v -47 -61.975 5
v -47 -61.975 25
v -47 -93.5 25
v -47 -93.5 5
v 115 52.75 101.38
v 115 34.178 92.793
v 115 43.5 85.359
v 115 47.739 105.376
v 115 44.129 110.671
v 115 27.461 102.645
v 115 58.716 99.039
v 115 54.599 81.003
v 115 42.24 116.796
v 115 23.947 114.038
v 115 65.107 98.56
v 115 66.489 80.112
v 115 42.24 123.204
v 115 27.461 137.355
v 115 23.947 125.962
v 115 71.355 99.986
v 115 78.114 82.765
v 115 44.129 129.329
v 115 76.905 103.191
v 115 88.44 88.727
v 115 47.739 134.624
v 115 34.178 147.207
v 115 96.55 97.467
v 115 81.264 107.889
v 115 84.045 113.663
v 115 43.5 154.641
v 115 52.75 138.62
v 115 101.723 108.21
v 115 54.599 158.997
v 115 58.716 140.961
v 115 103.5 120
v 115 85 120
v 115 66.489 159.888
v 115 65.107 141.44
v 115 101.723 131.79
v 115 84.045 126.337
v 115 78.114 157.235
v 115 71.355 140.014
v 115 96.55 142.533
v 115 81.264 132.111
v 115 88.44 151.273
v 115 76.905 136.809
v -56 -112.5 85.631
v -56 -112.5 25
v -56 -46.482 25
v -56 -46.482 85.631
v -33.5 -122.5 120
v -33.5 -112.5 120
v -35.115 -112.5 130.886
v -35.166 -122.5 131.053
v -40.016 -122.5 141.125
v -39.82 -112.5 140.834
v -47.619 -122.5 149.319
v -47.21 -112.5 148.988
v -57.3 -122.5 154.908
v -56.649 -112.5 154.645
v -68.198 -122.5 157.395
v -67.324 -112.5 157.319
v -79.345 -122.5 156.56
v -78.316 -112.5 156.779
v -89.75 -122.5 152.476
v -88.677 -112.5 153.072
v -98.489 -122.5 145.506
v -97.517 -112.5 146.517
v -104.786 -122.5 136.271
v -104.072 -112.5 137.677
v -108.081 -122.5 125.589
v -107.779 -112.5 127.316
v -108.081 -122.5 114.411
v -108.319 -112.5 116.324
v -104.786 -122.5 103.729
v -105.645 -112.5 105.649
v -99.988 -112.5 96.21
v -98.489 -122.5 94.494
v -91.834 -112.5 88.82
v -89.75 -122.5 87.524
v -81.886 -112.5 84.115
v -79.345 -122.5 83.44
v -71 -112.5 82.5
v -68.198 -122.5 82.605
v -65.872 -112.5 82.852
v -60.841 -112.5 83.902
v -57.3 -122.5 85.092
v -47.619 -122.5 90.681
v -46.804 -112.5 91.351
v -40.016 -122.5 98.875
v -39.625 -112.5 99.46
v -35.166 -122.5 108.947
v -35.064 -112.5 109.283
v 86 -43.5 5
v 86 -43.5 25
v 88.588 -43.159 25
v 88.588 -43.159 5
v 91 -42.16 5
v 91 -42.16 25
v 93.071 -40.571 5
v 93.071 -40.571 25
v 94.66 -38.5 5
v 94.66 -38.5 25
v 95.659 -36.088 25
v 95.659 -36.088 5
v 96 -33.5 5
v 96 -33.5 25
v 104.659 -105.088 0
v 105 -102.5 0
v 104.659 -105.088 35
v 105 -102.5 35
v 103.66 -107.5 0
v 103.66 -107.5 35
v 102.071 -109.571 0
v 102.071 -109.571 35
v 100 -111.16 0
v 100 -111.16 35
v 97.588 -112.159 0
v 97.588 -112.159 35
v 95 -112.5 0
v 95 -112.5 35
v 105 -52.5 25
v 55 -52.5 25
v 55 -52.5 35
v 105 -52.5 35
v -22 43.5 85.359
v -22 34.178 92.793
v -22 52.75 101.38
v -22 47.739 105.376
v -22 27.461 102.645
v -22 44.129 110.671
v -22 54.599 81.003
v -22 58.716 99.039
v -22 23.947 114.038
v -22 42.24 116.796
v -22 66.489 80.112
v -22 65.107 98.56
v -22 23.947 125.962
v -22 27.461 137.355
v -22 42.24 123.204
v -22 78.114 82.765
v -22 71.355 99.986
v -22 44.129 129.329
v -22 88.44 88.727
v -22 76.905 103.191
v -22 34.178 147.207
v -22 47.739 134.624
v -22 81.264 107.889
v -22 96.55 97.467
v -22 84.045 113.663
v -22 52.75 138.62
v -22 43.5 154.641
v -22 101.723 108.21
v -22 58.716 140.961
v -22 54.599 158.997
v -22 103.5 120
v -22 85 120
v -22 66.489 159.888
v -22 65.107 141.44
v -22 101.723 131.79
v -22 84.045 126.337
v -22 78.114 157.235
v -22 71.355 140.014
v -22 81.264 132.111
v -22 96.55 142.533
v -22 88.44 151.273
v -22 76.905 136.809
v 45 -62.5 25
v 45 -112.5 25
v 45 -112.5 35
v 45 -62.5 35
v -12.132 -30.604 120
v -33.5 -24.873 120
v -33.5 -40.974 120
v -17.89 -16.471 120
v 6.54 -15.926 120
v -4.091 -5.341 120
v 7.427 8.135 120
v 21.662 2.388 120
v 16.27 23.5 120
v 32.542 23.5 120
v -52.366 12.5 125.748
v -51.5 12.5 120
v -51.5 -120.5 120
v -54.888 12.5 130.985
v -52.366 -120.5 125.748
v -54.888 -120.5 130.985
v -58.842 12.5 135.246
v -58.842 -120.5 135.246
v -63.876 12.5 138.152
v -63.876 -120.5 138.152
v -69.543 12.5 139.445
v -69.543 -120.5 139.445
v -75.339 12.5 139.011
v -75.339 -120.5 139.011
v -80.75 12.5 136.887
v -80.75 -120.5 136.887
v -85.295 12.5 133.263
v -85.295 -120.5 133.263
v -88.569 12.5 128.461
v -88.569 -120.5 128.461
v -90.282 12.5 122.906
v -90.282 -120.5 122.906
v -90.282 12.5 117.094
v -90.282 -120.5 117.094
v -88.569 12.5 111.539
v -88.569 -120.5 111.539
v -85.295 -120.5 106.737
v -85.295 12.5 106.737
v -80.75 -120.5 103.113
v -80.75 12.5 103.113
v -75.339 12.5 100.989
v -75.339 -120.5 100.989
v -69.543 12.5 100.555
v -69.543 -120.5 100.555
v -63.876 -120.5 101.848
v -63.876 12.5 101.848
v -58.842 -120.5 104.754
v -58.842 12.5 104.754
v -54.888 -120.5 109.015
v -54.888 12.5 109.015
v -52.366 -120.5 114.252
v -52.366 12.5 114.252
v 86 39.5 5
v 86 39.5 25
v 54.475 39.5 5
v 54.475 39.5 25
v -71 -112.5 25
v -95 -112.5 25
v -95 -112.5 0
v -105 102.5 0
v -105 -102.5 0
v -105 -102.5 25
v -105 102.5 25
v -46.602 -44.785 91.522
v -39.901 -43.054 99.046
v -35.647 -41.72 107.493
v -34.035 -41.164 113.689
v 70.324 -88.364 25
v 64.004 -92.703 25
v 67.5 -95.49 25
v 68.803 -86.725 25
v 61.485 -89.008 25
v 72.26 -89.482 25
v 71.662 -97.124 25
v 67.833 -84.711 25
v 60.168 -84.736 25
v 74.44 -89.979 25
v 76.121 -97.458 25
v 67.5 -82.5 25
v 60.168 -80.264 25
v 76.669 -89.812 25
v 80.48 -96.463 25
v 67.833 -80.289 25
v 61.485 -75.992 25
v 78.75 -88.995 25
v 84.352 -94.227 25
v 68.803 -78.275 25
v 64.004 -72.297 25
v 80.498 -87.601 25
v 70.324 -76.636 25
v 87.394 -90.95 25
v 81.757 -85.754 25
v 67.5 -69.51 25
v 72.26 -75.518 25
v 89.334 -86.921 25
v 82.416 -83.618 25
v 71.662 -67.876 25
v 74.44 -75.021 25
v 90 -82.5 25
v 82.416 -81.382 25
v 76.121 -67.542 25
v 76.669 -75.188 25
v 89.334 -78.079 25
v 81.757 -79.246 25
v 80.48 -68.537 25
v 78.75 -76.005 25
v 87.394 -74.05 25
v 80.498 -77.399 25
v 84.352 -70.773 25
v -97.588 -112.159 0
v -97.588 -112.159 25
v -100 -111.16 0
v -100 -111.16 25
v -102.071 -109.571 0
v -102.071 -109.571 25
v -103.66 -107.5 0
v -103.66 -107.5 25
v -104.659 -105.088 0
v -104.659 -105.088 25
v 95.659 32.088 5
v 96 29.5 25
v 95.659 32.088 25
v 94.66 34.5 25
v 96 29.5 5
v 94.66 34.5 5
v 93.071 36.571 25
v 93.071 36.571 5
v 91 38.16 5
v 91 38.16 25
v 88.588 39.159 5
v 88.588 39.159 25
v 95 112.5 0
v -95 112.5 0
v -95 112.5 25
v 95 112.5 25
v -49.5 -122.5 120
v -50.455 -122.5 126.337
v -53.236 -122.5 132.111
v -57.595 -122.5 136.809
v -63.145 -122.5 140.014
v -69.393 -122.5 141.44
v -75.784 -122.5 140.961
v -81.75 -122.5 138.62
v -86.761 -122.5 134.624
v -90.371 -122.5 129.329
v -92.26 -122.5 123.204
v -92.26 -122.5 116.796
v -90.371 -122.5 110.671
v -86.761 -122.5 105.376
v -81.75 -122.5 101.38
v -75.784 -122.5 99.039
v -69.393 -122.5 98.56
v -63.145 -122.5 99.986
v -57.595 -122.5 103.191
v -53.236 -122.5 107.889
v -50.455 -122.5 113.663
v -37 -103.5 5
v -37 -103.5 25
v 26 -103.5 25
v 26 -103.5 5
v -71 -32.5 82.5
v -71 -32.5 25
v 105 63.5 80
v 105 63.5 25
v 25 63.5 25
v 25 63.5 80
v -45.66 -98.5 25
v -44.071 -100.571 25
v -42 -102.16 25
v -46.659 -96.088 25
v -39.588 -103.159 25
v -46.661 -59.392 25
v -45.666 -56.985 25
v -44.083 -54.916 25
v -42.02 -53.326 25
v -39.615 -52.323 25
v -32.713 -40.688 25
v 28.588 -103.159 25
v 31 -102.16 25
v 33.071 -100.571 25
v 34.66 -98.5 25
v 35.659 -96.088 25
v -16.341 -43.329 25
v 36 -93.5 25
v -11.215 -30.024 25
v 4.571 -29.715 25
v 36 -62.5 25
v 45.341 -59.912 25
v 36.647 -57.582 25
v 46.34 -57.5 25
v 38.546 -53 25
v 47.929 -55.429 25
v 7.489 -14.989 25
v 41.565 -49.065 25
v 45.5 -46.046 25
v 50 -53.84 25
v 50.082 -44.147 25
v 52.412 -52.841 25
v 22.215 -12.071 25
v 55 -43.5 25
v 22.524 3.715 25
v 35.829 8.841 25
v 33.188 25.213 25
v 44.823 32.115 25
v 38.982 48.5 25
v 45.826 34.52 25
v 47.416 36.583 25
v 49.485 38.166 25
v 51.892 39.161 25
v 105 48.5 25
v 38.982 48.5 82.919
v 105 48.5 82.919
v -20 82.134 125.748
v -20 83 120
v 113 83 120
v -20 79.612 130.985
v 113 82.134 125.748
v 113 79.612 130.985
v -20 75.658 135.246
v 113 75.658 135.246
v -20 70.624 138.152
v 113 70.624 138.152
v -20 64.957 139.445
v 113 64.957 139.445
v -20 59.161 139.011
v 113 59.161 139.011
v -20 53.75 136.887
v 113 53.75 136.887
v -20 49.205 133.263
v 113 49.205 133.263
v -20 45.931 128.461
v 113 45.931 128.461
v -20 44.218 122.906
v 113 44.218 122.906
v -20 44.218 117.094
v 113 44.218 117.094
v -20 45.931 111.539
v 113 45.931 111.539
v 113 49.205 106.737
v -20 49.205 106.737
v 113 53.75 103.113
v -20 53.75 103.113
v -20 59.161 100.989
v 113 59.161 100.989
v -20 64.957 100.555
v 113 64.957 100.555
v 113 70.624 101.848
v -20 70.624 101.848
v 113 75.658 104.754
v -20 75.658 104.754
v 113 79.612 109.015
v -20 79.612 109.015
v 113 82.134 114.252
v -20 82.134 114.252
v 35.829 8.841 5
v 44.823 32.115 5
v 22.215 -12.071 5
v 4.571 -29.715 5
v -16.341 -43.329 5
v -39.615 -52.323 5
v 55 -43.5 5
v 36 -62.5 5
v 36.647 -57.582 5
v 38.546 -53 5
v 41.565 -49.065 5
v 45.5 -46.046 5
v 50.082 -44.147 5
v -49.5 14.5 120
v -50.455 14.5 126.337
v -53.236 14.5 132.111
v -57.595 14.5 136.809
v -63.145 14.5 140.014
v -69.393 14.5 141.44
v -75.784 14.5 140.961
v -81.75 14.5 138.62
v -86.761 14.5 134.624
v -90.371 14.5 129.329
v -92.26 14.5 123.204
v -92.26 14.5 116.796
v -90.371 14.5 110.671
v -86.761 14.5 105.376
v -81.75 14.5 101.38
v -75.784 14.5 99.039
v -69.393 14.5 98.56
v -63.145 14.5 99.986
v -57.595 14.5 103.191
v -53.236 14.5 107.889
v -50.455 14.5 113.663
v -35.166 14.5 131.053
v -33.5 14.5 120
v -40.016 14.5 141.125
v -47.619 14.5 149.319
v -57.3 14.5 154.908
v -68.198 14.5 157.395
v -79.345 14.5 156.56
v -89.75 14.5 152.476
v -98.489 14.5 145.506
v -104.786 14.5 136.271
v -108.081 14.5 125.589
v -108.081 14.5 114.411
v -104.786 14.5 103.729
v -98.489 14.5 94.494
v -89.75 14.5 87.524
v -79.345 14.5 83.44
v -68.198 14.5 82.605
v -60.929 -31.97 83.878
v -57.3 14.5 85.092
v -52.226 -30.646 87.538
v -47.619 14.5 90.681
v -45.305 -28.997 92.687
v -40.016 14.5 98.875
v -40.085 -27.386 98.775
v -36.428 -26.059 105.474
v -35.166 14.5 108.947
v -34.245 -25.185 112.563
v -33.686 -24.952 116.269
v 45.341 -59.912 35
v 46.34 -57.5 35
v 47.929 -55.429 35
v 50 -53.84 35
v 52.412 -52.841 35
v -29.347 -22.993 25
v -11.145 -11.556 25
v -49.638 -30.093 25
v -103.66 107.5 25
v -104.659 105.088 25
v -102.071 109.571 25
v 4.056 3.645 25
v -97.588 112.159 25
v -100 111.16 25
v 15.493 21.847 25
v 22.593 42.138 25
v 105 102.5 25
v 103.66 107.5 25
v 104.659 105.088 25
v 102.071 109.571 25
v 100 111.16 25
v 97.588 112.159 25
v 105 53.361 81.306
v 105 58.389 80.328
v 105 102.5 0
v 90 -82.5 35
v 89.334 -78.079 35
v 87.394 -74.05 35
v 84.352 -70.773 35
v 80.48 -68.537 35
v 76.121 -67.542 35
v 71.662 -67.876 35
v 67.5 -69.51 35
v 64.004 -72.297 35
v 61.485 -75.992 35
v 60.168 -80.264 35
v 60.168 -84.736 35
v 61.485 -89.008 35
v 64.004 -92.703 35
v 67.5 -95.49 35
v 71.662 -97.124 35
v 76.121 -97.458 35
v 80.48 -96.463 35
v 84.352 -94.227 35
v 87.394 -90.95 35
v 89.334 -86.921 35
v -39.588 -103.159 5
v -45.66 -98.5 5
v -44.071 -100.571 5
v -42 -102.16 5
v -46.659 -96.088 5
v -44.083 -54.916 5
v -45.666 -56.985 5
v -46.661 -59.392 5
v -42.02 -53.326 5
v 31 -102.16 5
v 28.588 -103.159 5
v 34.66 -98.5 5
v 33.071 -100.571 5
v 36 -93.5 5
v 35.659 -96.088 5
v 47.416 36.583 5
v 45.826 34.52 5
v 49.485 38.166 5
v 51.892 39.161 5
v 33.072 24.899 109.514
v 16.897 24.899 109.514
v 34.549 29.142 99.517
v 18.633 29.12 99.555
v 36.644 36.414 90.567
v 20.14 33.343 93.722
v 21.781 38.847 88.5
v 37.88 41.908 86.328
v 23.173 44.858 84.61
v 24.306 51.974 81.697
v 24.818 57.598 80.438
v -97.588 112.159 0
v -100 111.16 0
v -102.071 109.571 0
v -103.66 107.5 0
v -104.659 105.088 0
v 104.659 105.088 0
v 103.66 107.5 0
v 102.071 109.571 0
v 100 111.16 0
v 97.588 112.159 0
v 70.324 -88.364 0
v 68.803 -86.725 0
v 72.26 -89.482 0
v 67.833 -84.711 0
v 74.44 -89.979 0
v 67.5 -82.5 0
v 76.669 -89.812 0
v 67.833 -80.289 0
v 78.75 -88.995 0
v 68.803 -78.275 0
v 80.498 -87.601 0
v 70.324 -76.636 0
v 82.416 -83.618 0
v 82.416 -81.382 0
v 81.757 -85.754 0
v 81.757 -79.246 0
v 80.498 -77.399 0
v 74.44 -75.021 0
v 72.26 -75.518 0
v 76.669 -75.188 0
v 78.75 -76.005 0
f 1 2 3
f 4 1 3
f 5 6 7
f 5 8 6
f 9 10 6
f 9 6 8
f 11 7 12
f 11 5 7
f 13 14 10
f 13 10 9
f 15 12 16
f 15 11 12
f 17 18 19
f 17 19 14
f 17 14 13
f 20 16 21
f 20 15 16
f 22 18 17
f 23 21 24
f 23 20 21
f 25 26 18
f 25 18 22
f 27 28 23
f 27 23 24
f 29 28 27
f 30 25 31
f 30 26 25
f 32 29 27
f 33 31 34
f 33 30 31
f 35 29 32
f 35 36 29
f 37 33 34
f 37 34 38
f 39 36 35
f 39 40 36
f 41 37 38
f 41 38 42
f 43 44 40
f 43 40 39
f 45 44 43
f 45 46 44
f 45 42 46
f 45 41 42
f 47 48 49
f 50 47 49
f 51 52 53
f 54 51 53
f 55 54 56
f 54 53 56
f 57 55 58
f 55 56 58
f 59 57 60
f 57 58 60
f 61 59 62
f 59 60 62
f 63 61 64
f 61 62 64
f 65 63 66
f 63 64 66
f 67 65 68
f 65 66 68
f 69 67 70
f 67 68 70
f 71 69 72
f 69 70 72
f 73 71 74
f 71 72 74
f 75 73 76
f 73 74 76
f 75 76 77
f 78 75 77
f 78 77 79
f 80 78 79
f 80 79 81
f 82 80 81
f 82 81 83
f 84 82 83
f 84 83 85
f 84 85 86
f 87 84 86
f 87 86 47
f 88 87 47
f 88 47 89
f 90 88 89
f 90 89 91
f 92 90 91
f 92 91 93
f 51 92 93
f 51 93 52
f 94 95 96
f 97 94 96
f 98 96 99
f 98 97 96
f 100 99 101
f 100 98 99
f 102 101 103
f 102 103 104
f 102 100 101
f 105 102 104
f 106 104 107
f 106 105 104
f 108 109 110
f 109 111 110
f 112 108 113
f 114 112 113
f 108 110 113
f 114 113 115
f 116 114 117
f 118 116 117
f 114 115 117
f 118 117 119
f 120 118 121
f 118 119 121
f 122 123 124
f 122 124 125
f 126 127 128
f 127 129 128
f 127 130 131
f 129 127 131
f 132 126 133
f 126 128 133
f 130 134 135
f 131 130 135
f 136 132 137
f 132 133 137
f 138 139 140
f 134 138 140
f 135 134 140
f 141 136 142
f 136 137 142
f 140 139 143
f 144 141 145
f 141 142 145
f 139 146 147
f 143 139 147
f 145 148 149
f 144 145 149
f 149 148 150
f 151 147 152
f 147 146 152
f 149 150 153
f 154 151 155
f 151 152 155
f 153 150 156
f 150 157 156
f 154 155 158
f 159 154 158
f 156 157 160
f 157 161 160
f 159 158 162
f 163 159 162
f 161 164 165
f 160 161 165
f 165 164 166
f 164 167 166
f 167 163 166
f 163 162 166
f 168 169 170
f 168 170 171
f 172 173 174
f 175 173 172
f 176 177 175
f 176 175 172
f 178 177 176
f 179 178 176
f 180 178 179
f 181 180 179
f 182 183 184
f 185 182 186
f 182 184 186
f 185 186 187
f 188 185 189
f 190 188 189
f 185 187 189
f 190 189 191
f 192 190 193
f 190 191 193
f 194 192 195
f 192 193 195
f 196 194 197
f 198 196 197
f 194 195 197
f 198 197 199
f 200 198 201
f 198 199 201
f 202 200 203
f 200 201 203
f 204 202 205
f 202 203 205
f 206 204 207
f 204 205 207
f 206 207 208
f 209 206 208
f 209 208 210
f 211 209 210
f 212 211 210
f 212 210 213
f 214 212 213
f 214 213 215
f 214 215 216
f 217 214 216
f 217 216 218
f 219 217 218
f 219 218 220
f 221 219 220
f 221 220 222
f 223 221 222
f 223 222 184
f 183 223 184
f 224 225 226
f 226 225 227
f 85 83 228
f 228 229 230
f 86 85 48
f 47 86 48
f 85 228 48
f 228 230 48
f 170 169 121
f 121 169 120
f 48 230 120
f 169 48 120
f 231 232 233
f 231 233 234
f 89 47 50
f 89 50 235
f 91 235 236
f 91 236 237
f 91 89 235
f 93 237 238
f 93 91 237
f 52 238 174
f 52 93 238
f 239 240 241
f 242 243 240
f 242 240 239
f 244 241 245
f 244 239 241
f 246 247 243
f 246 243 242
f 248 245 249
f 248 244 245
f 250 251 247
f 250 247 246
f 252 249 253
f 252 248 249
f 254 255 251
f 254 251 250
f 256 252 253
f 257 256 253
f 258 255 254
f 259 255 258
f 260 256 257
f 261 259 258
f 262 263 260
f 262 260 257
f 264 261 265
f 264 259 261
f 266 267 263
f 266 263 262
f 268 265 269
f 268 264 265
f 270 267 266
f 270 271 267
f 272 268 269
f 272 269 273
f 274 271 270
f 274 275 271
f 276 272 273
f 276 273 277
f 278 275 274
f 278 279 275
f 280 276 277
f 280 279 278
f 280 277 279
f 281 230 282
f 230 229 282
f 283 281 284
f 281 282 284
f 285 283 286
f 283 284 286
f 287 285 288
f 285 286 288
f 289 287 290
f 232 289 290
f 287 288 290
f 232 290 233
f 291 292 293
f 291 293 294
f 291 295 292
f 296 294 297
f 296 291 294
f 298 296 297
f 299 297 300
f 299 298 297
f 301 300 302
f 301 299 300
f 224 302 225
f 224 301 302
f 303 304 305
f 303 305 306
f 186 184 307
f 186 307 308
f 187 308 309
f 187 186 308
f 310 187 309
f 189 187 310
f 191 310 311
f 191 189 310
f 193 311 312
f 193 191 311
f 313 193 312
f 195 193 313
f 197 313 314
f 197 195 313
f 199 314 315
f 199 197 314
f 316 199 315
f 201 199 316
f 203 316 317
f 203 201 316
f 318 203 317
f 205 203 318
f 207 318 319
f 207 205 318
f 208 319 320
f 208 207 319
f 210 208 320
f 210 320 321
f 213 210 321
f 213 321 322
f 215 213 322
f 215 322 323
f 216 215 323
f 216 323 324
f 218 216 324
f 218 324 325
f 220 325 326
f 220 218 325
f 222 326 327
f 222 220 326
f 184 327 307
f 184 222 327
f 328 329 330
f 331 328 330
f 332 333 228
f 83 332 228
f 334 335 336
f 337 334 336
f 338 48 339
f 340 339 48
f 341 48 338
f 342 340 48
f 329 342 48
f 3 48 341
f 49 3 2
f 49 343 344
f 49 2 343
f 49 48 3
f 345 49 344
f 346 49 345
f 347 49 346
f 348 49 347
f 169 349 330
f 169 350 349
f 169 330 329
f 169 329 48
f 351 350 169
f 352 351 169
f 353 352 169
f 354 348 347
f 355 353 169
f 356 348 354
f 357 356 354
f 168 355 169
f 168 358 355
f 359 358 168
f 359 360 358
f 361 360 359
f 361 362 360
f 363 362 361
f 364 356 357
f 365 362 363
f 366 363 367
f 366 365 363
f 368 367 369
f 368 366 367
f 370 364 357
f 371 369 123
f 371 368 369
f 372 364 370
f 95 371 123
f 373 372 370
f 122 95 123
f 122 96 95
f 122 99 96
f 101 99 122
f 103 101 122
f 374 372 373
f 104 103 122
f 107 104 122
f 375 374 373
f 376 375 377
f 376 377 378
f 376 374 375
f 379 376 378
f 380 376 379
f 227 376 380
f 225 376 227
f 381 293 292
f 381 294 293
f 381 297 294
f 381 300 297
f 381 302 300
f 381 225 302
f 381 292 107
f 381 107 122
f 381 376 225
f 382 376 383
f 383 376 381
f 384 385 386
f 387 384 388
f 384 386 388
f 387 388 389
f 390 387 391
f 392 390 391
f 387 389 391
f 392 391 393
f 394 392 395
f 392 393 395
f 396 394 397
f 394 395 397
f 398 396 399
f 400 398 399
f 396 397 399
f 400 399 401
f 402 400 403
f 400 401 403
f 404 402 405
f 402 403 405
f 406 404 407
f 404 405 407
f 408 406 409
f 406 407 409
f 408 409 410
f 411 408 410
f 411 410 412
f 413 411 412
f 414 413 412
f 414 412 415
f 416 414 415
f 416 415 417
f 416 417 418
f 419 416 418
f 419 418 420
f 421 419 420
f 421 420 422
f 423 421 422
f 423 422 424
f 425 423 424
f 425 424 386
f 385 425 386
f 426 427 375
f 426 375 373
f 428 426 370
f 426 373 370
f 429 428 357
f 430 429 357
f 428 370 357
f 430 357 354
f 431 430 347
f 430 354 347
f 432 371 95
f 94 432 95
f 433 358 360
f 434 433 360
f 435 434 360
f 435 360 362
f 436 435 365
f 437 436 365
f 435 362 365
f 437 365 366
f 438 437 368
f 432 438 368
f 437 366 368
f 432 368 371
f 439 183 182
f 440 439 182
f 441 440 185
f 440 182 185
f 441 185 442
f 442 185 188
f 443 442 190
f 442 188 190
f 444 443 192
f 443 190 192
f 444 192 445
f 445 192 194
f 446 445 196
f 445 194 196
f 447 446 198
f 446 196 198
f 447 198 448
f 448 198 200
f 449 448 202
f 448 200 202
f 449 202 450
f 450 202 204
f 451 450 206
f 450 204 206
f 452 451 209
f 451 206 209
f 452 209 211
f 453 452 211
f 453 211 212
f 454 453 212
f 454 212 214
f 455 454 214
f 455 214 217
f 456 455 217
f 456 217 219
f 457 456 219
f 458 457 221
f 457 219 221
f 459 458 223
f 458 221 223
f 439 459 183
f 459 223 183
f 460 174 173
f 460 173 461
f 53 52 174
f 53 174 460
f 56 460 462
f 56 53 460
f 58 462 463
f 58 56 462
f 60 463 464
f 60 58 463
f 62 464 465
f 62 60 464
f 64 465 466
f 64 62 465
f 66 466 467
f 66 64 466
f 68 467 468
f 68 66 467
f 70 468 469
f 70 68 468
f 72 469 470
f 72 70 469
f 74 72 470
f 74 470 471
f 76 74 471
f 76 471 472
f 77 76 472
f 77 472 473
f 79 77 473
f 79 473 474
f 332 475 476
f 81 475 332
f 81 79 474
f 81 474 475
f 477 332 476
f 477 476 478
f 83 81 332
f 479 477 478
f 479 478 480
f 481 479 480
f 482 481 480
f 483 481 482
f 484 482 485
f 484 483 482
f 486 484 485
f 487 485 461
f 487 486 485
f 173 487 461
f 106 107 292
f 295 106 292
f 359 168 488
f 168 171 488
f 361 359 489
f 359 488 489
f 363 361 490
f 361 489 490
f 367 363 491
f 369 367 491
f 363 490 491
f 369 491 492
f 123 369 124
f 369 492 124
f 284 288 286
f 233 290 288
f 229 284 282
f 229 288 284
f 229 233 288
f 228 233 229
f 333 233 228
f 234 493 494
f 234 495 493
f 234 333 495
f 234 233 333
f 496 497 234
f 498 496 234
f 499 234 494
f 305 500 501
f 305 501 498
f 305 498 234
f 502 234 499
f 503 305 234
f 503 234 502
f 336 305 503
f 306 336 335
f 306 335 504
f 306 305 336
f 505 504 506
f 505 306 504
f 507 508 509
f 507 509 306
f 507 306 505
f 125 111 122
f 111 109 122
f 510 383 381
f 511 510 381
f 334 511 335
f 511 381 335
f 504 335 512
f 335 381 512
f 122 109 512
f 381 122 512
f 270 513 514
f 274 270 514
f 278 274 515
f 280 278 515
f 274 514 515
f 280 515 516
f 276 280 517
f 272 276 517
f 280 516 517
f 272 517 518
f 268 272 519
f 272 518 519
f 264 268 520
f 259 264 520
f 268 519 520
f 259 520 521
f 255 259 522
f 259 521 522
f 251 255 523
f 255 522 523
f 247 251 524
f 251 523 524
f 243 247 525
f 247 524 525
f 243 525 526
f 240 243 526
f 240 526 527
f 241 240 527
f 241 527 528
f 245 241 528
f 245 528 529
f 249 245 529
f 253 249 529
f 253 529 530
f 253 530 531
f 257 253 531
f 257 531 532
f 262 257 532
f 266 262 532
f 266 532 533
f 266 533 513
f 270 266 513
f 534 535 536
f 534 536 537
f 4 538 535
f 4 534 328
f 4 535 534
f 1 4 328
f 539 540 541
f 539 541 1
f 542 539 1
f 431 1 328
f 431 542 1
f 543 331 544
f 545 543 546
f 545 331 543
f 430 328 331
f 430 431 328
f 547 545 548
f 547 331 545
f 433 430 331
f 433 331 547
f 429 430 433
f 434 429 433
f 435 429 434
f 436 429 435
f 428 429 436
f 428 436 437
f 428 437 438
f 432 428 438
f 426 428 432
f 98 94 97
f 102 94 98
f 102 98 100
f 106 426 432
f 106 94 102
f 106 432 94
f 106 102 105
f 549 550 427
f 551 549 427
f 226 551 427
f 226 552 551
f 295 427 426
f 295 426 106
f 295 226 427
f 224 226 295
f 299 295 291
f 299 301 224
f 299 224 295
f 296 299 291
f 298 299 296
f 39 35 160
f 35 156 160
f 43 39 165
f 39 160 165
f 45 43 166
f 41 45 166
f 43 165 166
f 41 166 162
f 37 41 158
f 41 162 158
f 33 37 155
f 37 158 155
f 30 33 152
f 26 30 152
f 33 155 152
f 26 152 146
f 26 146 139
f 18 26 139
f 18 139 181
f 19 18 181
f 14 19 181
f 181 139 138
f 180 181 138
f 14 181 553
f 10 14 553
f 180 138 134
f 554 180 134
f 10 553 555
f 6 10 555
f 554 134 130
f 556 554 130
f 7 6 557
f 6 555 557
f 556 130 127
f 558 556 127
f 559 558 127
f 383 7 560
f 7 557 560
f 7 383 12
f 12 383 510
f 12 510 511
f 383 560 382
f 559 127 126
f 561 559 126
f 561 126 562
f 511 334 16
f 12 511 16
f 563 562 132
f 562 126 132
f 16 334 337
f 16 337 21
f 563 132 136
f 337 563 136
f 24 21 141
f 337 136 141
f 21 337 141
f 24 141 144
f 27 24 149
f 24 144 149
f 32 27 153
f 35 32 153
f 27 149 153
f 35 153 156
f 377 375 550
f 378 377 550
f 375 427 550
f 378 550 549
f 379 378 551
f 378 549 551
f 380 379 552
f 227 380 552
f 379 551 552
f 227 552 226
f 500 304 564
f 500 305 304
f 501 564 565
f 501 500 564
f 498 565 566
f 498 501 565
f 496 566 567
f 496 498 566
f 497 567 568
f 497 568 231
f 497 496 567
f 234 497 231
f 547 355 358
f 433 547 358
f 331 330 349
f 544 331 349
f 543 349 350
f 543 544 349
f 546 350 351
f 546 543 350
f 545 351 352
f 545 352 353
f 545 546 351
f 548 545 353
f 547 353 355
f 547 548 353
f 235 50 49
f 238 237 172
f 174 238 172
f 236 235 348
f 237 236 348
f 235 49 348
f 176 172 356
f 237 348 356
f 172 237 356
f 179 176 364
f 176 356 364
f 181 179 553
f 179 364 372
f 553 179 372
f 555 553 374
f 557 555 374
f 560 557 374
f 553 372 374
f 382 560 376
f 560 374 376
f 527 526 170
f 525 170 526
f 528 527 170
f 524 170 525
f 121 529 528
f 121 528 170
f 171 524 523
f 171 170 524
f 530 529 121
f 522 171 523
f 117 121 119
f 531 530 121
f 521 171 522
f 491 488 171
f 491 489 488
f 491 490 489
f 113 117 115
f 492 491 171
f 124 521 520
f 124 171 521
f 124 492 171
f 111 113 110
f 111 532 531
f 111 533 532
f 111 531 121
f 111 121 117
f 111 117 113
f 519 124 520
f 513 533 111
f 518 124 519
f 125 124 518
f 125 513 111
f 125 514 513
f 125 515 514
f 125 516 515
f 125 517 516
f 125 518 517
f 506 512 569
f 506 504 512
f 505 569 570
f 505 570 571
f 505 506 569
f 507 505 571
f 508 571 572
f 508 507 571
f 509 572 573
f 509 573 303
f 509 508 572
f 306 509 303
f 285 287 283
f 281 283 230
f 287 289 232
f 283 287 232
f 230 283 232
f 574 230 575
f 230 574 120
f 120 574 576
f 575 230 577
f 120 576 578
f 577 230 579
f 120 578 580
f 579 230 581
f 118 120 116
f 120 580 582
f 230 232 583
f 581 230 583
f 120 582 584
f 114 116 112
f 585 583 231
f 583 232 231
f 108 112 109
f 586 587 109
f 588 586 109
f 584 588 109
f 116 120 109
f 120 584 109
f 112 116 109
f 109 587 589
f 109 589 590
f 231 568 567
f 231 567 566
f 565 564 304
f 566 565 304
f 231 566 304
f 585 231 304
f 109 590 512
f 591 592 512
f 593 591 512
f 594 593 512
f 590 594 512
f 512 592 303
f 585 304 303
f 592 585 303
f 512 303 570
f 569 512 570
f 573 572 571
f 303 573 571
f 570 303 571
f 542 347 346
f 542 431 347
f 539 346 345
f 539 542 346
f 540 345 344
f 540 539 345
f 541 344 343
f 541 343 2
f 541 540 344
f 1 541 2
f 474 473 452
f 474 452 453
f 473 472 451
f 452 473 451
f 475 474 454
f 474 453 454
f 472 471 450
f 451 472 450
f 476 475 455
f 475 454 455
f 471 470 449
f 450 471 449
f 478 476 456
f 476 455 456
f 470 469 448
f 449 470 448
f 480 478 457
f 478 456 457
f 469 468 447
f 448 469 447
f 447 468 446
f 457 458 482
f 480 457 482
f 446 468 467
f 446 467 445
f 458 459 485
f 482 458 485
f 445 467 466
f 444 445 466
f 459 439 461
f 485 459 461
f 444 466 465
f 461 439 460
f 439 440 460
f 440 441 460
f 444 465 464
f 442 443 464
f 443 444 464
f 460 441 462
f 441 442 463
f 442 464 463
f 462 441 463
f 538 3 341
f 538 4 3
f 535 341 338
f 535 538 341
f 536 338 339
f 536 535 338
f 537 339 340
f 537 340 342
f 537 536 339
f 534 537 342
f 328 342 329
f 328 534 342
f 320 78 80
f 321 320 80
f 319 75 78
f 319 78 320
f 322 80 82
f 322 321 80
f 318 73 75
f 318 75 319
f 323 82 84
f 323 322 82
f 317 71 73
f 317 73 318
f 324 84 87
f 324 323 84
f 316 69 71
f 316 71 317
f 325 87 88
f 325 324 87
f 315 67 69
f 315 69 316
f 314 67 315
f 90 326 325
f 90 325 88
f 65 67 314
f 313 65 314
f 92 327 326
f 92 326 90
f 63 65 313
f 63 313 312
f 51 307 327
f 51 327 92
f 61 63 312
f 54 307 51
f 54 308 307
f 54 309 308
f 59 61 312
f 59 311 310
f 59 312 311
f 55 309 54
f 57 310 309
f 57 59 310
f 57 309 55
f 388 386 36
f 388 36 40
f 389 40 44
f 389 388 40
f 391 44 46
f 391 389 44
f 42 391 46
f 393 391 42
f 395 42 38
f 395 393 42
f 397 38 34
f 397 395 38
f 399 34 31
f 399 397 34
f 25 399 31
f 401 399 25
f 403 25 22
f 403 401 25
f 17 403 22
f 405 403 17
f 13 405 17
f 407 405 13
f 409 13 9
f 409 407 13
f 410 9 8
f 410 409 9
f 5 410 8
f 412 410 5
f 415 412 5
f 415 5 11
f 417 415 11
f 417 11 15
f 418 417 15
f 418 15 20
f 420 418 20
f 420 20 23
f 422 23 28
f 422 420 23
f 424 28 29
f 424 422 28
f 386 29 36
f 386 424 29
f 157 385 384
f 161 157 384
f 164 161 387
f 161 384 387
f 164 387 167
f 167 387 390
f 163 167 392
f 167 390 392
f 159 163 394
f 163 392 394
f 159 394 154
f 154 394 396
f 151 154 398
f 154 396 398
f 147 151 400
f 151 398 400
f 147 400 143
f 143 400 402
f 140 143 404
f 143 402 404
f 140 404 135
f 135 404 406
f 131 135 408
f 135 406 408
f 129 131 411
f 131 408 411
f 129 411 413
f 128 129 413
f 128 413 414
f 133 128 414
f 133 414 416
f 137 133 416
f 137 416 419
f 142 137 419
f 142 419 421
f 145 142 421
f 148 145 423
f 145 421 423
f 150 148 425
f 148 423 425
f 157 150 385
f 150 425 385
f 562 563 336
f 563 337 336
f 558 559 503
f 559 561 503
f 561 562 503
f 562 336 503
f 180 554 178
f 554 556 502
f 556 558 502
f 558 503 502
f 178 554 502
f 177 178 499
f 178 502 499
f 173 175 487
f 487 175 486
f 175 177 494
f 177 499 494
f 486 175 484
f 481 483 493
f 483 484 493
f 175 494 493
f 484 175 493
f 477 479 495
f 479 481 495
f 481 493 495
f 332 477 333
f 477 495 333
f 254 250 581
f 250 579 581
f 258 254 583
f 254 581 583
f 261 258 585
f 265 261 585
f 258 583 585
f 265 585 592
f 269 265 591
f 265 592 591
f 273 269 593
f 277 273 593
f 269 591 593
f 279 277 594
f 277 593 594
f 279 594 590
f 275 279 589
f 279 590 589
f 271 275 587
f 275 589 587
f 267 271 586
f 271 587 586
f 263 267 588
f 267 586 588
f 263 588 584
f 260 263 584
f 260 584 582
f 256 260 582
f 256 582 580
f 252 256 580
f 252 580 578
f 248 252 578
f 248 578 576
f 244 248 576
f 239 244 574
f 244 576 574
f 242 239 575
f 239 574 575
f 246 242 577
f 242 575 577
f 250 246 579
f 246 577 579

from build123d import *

# Parameters (mm, degrees)
F0_W            = 210
F0_H            = 225
F1_DEPTH        = 25
F3_DEPTH        = 95
F4_R            = 37.5
F5_DEPTH        = 10
F5_DEPTH_BACK   = 127
F6_R            = 40
F7_DEPTH        = 10
F7_DEPTH_BACK   = 127
F8_W            = 60
F8_H            = 60
F9_DEPTH        = 10
F10_R           = 10
F12_DEPTH       = 20
F14_D           = 15
F14_CBORE_D     = 30
F14_CBORE_DEPTH = 10
F15_R           = 10
F16_R           = 19.5
F17_DEPTH       = 235.001
F18_R           = 19.5
F19_DEPTH       = 223.501
F20_SIZE        = 2
F21_R           = 10


with BuildPart() as f1:
    # F0 (on Top) → F1 (new body)
    with BuildSketch(Plane.XY):
        Rectangle(F0_W, F0_H)
    extrude(amount=F1_DEPTH)

    # F2 (on face) → F3 (join)
    with BuildSketch(Plane.XY.offset(25)):
        with BuildLine():
            Line((-71, -32.5), (-71, -112.5))
            Line((-71, -112.5), (-56.000001, -112.5))
            Line((-56.000001, -112.5), (-56.000001, -46.481815))
            ThreePointArc((-56.000001, -46.481815), (7.488852, -14.988852), (38.981815, 48.500001))
            Line((38.981815, 48.500001), (105, 48.500001))
            Line((105, 48.500001), (105, 63.5))
            Line((105, 63.5), (25, 63.5))
            ThreePointArc((25, 63.5), (-3.117749, -4.382251), (-71, -32.5))
        make_face()
    extrude(amount=F3_DEPTH)

    # F4 (on face) → F5 (join, two sides)
    with BuildSketch(Plane.XZ.offset(112.5)) as f5_sk:
        with Locations((-71, 120)):
            Circle(F4_R)
    extrude(amount=F5_DEPTH)
    extrude(f5_sk.sketch, amount=-F5_DEPTH_BACK)

    # F6 (on face) → F7 (join, two sides)
    with BuildSketch(Plane.YZ.offset(105)) as f7_sk:
        with Locations((63.5, 120)):
            Circle(F6_R)
    extrude(amount=F7_DEPTH)
    extrude(f7_sk.sketch, amount=-F7_DEPTH_BACK)

    # F8 (on face) → F9 (join)
    with BuildSketch(Plane.XY.offset(25)):
        with Locations((75, -82.5)):
            Rectangle(F8_W, F8_H)
    extrude(amount=F9_DEPTH)

    # F10
    f10_edges = [f1.edges().sort_by_distance(p)[0] for p in [
        (45, -52.5, 30),
    ]]
    fillet(f10_edges, radius=F10_R)

    # F11 (on face) → F12 (cut)
    with BuildSketch(Plane.XY.offset(25)):
        with BuildLine():
            ThreePointArc((46.575506, 39.500001), (13.852813, -21.352813), (-47.000001, -54.075506))
            Line((-47.000001, -54.075506), (-47.000001, -103.5))
            Line((-47.000001, -103.5), (36, -103.5))
            Line((36, -103.5), (36, -62.5))
            ThreePointArc((36, -62.5), (41.564971, -49.064971), (55, -43.5))
            Line((55, -43.5), (96, -43.5))
            Line((96, -43.5), (96, 39.500001))
            Line((96, 39.500001), (46.575506, 39.500001))
        make_face()
    extrude(amount=-F12_DEPTH, mode=Mode.SUBTRACT)

    # F14 (through all)
    with Locations(Plane.XY.offset(35)):
        with Locations((75, -82.5)):
            CounterBoreHole(F14_D / 2, F14_CBORE_D / 2, F14_CBORE_DEPTH)

    # F15
    f15_edges = [f1.edges().sort_by_distance(p)[0] for p in [
        (-47.000001, -54.075506, 15),
        (46.575506, 39.500001, 15),
        (96, 39.500001, 15),
        (-47.000001, -103.5, 15),
        (36, -103.5, 15),
        (96, -43.5, 15),
    ]]
    fillet(f15_edges, radius=F15_R)

    # F16 (on face) → F17 (cut, through all)
    with BuildSketch(Plane.XZ.offset(122.5)):
        with Locations((-71, 120)):
            Circle(F16_R)
    extrude(amount=-F17_DEPTH, mode=Mode.SUBTRACT)

    # F18 (on face) → F19 (cut, through all)
    with BuildSketch(Plane.YZ.offset(115)):
        with Locations((63.5, 120)):
            Circle(F18_R)
    extrude(amount=-F19_DEPTH, mode=Mode.SUBTRACT)

    # F20
    f20_edges = [f1.edges().sort_by_distance(p)[0] for p in [
        (-90.5, -122.5, 120),
        (115, 44, 120),
        (-22, 44, 120),
        (-90.5, 14.5, 120),
    ]]
    chamfer(f20_edges, length=F20_SIZE)

    # F21
    f21_edges = [f1.edges().sort_by_distance(p)[0] for p in [
        (105, -112.5, 17.5),
        (105, 112.5, 12.5),
        (-105, -112.5, 12.5),
        (-105, 112.5, 12.5),
    ]]
    fillet(f21_edges, radius=F21_R)


solid = f1.part
